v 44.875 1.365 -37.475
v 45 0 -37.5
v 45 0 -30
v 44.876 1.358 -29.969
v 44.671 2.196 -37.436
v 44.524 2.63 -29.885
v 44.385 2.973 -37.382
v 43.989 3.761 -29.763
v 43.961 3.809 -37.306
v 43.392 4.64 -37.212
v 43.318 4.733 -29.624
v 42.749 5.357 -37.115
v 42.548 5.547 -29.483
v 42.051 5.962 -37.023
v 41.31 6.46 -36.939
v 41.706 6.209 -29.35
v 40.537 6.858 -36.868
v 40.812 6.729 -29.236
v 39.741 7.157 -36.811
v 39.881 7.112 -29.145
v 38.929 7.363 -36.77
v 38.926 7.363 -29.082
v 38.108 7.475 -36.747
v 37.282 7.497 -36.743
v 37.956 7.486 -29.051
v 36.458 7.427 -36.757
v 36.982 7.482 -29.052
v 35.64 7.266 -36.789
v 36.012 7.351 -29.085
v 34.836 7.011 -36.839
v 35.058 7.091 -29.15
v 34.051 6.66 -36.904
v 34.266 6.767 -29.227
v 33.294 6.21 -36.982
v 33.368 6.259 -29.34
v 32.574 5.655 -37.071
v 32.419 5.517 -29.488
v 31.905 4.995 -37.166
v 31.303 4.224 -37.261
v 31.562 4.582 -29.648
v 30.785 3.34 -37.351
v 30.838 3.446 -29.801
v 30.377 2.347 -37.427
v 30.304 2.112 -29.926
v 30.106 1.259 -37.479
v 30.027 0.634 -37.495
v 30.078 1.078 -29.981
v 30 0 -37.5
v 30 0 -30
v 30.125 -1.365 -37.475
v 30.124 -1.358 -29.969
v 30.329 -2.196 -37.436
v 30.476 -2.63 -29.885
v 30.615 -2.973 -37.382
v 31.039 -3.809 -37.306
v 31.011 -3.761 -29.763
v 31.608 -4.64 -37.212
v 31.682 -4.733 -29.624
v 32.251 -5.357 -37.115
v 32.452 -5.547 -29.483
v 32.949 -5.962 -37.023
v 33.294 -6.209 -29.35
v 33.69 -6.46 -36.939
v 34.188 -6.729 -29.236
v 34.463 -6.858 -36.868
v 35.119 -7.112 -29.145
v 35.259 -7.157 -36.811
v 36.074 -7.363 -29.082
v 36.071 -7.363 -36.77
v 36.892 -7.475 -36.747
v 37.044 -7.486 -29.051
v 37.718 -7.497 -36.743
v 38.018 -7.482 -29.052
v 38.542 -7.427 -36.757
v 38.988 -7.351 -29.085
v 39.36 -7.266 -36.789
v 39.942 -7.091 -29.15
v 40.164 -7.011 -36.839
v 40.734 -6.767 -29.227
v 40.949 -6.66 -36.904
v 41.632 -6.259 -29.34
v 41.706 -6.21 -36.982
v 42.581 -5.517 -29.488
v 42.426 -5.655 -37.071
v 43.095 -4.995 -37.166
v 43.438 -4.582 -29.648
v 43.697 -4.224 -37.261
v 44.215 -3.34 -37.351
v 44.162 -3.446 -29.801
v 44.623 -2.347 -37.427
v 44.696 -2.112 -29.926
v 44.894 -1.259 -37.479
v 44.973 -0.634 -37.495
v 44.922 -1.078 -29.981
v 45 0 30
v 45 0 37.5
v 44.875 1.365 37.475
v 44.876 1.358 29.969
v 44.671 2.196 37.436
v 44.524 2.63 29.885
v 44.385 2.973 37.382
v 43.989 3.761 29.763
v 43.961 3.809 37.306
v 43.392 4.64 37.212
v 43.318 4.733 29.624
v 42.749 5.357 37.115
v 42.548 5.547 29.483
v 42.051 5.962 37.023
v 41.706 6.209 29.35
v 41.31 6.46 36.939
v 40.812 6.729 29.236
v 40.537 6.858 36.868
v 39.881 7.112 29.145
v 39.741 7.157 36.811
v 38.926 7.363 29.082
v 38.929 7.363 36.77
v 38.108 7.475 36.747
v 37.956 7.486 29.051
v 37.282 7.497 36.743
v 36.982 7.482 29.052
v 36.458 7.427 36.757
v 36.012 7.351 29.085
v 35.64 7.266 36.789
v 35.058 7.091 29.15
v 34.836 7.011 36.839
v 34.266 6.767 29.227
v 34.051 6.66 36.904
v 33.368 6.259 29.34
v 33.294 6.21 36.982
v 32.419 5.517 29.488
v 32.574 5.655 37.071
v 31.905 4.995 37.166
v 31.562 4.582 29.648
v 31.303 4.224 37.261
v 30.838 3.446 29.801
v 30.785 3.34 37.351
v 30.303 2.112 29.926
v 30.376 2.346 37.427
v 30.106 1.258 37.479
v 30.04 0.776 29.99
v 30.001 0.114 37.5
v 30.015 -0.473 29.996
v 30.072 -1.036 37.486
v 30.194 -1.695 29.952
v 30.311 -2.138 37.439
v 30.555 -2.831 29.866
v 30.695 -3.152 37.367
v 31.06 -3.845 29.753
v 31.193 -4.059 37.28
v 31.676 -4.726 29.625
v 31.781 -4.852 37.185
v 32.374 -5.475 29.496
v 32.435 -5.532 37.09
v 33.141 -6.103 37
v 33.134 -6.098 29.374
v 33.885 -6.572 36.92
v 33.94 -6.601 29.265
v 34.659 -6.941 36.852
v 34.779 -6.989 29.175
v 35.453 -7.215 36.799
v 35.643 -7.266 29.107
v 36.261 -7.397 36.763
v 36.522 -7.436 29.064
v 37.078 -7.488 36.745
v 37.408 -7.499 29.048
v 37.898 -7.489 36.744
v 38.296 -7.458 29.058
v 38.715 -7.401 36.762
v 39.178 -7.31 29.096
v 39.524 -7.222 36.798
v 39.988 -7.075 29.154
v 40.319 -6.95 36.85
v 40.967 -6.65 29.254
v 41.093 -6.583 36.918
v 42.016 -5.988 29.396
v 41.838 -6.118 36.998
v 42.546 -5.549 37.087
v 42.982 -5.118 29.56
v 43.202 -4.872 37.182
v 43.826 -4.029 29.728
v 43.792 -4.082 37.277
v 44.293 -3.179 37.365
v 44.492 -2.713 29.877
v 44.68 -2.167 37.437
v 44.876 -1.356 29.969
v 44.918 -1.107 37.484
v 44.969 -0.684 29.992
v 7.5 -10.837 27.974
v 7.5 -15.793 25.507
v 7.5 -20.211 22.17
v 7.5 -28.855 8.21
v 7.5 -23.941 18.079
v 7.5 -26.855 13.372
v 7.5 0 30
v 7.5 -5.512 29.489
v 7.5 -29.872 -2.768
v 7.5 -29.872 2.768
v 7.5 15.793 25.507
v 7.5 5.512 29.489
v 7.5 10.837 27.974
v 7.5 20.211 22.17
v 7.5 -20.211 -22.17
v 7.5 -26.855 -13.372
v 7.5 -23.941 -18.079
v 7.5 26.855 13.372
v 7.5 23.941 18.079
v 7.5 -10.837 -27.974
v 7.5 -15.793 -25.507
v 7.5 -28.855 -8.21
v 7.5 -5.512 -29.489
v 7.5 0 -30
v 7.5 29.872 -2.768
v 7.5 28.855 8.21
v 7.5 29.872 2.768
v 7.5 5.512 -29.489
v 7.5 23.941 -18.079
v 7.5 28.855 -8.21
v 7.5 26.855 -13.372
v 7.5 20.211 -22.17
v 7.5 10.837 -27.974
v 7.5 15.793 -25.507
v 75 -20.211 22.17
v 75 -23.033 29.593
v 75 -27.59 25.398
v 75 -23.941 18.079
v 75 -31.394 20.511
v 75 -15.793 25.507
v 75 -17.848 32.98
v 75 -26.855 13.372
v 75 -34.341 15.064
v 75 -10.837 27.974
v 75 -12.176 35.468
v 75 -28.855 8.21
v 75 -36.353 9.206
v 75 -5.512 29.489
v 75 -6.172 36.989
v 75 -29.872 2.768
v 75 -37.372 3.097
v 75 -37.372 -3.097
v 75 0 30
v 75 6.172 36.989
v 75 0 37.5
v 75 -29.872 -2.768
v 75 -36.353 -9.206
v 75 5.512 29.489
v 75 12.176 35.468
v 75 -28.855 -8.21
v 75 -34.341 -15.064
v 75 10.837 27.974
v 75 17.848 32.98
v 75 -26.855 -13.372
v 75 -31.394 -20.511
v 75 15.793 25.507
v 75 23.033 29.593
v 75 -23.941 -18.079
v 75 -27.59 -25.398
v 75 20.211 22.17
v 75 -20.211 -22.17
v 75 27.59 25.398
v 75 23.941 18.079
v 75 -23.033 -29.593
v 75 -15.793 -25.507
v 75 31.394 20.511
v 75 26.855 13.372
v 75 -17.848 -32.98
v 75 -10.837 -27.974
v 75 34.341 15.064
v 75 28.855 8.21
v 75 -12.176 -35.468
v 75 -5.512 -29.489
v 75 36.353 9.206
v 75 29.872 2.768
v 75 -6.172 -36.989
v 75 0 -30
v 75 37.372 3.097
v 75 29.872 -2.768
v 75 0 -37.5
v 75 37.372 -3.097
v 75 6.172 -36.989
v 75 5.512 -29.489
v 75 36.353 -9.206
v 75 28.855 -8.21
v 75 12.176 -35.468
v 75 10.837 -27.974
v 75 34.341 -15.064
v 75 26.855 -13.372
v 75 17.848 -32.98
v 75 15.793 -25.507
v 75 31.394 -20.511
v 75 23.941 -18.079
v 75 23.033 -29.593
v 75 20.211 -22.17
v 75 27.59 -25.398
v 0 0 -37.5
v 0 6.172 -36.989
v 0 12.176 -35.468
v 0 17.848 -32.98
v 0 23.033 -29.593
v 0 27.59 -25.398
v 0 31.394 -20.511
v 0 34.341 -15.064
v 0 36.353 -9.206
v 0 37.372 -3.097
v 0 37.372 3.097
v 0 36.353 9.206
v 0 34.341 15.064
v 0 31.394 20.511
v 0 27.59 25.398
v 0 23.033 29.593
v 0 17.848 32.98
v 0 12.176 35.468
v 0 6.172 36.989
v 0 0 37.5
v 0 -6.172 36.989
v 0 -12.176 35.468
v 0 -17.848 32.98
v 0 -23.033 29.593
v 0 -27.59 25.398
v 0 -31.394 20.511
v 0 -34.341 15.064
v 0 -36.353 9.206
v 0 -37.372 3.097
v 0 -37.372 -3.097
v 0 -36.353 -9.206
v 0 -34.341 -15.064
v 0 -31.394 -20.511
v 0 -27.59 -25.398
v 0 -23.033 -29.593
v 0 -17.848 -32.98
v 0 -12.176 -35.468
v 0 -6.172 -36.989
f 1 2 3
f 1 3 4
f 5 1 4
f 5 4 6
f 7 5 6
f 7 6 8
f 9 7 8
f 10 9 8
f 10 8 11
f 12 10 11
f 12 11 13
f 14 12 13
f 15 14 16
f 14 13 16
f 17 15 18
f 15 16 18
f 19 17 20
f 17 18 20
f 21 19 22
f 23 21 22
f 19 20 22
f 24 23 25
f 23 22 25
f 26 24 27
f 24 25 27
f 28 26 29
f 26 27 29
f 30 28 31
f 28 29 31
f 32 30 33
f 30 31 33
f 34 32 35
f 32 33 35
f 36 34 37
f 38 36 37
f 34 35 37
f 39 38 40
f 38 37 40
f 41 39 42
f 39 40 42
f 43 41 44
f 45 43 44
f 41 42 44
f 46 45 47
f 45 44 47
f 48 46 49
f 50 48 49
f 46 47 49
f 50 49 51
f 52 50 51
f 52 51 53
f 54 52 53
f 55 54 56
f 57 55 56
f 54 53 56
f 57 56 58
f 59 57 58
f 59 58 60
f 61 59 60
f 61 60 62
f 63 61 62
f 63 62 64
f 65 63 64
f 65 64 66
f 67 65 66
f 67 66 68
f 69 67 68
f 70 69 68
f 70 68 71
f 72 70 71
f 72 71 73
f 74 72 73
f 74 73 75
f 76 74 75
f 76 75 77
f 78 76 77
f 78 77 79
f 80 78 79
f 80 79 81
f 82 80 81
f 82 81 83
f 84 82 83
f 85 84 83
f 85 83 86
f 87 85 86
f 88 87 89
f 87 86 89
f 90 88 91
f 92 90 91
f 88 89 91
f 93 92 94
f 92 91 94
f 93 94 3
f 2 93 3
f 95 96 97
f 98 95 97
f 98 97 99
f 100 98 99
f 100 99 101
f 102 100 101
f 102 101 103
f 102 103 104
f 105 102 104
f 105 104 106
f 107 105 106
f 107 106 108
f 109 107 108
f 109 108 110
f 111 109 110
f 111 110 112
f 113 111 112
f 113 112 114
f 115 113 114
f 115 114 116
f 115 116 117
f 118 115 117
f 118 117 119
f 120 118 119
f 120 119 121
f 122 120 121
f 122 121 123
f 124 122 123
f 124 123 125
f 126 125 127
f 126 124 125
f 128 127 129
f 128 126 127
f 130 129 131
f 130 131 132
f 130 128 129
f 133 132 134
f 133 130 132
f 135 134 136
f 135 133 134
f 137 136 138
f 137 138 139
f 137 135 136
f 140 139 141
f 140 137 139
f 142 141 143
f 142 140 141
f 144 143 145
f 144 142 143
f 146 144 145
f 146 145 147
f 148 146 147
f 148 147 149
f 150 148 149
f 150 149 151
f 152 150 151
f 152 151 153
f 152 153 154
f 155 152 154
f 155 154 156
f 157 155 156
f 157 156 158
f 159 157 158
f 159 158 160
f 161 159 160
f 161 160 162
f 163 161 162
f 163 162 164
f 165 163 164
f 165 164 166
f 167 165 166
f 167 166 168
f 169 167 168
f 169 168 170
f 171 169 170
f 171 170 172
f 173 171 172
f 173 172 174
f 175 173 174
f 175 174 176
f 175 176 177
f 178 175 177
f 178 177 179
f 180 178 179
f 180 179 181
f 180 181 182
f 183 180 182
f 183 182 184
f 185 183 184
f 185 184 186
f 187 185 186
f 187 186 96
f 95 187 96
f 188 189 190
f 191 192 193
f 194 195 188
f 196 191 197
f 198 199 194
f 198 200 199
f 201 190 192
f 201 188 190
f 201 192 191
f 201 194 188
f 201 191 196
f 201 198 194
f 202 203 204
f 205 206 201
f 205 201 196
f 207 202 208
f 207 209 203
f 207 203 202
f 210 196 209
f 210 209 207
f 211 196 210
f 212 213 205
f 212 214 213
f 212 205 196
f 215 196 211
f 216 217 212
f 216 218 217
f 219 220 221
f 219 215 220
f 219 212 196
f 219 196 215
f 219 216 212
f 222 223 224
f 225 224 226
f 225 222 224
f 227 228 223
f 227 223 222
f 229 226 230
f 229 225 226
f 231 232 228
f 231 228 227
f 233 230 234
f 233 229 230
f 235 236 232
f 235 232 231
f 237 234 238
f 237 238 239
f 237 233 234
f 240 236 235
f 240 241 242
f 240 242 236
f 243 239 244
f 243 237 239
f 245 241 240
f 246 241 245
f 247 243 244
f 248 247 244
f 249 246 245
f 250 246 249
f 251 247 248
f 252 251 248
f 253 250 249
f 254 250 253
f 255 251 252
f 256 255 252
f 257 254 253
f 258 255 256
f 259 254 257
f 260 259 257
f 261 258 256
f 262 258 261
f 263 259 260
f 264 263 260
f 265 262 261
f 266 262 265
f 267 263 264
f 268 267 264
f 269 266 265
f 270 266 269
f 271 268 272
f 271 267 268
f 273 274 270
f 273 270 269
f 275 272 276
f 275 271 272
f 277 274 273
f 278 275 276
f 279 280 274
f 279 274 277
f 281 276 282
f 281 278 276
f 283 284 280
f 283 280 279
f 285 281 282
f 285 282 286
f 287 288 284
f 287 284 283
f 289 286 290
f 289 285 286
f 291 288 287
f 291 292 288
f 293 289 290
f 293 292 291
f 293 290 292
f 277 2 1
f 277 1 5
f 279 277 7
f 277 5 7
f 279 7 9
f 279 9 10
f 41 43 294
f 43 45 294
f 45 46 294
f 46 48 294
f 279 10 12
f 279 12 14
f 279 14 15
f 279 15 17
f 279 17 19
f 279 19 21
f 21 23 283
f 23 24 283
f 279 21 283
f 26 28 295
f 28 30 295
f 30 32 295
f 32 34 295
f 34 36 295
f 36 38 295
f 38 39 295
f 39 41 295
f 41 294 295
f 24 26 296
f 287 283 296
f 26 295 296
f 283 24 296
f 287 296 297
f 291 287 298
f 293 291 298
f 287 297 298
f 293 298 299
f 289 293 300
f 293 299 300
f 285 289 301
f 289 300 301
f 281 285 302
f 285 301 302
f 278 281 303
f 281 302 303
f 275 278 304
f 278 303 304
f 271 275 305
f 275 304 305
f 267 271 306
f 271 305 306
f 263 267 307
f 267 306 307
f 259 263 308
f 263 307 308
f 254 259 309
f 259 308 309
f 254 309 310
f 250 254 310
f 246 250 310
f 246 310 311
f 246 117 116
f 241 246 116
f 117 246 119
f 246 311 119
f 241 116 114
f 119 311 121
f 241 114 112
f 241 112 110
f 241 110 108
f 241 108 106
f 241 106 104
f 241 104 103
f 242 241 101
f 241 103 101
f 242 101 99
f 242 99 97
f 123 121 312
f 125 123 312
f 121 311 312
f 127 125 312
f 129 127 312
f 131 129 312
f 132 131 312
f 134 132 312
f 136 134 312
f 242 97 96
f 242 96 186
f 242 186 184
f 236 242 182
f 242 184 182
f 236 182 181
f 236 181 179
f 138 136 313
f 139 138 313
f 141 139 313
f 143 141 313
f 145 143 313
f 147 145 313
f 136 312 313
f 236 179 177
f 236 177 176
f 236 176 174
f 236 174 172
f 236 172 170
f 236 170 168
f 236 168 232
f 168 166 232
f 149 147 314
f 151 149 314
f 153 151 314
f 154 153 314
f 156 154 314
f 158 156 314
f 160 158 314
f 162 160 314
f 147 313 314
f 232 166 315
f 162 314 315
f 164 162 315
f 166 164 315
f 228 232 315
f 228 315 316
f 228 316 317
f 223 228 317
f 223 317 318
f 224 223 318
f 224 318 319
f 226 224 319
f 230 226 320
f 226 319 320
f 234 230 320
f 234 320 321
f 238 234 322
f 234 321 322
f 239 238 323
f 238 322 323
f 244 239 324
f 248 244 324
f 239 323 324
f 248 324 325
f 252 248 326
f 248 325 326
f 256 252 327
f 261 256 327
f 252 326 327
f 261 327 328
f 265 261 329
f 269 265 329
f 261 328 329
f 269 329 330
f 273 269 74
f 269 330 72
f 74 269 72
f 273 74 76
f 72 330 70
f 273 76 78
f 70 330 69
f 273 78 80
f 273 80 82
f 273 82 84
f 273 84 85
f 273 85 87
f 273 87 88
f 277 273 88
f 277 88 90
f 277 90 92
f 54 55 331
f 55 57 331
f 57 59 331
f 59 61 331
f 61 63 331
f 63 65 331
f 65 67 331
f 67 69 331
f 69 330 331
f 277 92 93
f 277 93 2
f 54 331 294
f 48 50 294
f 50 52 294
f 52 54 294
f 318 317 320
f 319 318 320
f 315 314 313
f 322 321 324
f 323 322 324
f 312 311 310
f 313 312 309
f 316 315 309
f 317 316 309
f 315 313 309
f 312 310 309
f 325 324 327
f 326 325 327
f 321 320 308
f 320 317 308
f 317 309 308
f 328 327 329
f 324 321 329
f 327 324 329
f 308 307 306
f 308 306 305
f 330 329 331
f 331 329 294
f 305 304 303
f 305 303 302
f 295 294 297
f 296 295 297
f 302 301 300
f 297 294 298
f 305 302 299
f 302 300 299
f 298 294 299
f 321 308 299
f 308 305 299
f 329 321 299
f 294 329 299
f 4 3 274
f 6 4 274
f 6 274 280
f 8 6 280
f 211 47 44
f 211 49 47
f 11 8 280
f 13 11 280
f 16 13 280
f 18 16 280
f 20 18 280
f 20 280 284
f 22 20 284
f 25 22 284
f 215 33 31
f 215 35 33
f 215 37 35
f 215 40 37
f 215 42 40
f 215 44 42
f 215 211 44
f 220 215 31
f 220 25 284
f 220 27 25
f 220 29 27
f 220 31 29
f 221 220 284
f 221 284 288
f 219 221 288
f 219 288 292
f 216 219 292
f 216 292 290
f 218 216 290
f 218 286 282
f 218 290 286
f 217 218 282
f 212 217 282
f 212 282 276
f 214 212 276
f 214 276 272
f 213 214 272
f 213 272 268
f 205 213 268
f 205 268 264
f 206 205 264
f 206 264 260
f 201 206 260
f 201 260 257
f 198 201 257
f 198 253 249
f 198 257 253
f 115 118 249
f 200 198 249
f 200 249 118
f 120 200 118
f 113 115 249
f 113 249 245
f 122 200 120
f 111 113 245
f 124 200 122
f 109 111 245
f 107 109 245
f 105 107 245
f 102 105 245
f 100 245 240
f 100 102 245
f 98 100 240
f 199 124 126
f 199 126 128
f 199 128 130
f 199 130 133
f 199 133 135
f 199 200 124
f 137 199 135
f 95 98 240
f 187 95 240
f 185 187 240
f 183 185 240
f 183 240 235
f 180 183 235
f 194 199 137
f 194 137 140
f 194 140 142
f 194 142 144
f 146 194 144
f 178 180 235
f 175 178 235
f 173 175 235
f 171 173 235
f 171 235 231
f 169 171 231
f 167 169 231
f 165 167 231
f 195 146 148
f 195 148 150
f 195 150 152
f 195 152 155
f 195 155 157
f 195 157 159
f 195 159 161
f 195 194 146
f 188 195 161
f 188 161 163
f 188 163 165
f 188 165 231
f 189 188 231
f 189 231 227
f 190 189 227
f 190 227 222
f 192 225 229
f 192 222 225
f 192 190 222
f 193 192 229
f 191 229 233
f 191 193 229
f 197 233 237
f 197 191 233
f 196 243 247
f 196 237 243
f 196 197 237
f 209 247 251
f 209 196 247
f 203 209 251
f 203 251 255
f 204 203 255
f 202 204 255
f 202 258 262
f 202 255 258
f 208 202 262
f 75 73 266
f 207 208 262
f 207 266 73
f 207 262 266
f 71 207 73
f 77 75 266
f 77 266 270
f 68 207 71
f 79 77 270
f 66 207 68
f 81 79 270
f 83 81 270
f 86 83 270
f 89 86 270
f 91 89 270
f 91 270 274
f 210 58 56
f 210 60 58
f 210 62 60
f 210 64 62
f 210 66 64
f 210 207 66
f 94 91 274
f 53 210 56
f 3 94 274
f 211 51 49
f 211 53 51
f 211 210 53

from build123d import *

# Parameters (mm, degrees)
SKETCH1_R               = 37.5
BOSS_EXTRUDE1_DEPTH     = 75
SHELL1_T                = -7.5
SKETCH2_R               = 7.5
CUT_EXTRUDE1_DEPTH      = 92.855865354
CUT_EXTRUDE1_DEPTH_BACK = 92.855865354


with BuildPart() as part:
    # Sketch1 → Boss-Extrude1 (new body)
    with BuildSketch(Plane(origin=(0, 0, 0), x_dir=(0, 0, -1), z_dir=(1, 0, 0))):
        Circle(SKETCH1_R)
    extrude(amount=BOSS_EXTRUDE1_DEPTH)

    # Shell1
    shell1_openings = [part.faces().sort_by_distance(p)[0] for p in [
        (75, 0, 0),
    ]]
    offset(amount=SHELL1_T, openings=shell1_openings, kind=Kind.INTERSECTION)

    # Sketch2 → Cut-Extrude1 (cut, two sides)
    with BuildSketch(Plane.XY) as cut_extrude1_sk:
        with Locations((37.5, 0)):
            Circle(SKETCH2_R)
    extrude(amount=CUT_EXTRUDE1_DEPTH, mode=Mode.SUBTRACT)
    extrude(cut_extrude1_sk.sketch, amount=-CUT_EXTRUDE1_DEPTH_BACK, mode=Mode.SUBTRACT)


solid = part.part
